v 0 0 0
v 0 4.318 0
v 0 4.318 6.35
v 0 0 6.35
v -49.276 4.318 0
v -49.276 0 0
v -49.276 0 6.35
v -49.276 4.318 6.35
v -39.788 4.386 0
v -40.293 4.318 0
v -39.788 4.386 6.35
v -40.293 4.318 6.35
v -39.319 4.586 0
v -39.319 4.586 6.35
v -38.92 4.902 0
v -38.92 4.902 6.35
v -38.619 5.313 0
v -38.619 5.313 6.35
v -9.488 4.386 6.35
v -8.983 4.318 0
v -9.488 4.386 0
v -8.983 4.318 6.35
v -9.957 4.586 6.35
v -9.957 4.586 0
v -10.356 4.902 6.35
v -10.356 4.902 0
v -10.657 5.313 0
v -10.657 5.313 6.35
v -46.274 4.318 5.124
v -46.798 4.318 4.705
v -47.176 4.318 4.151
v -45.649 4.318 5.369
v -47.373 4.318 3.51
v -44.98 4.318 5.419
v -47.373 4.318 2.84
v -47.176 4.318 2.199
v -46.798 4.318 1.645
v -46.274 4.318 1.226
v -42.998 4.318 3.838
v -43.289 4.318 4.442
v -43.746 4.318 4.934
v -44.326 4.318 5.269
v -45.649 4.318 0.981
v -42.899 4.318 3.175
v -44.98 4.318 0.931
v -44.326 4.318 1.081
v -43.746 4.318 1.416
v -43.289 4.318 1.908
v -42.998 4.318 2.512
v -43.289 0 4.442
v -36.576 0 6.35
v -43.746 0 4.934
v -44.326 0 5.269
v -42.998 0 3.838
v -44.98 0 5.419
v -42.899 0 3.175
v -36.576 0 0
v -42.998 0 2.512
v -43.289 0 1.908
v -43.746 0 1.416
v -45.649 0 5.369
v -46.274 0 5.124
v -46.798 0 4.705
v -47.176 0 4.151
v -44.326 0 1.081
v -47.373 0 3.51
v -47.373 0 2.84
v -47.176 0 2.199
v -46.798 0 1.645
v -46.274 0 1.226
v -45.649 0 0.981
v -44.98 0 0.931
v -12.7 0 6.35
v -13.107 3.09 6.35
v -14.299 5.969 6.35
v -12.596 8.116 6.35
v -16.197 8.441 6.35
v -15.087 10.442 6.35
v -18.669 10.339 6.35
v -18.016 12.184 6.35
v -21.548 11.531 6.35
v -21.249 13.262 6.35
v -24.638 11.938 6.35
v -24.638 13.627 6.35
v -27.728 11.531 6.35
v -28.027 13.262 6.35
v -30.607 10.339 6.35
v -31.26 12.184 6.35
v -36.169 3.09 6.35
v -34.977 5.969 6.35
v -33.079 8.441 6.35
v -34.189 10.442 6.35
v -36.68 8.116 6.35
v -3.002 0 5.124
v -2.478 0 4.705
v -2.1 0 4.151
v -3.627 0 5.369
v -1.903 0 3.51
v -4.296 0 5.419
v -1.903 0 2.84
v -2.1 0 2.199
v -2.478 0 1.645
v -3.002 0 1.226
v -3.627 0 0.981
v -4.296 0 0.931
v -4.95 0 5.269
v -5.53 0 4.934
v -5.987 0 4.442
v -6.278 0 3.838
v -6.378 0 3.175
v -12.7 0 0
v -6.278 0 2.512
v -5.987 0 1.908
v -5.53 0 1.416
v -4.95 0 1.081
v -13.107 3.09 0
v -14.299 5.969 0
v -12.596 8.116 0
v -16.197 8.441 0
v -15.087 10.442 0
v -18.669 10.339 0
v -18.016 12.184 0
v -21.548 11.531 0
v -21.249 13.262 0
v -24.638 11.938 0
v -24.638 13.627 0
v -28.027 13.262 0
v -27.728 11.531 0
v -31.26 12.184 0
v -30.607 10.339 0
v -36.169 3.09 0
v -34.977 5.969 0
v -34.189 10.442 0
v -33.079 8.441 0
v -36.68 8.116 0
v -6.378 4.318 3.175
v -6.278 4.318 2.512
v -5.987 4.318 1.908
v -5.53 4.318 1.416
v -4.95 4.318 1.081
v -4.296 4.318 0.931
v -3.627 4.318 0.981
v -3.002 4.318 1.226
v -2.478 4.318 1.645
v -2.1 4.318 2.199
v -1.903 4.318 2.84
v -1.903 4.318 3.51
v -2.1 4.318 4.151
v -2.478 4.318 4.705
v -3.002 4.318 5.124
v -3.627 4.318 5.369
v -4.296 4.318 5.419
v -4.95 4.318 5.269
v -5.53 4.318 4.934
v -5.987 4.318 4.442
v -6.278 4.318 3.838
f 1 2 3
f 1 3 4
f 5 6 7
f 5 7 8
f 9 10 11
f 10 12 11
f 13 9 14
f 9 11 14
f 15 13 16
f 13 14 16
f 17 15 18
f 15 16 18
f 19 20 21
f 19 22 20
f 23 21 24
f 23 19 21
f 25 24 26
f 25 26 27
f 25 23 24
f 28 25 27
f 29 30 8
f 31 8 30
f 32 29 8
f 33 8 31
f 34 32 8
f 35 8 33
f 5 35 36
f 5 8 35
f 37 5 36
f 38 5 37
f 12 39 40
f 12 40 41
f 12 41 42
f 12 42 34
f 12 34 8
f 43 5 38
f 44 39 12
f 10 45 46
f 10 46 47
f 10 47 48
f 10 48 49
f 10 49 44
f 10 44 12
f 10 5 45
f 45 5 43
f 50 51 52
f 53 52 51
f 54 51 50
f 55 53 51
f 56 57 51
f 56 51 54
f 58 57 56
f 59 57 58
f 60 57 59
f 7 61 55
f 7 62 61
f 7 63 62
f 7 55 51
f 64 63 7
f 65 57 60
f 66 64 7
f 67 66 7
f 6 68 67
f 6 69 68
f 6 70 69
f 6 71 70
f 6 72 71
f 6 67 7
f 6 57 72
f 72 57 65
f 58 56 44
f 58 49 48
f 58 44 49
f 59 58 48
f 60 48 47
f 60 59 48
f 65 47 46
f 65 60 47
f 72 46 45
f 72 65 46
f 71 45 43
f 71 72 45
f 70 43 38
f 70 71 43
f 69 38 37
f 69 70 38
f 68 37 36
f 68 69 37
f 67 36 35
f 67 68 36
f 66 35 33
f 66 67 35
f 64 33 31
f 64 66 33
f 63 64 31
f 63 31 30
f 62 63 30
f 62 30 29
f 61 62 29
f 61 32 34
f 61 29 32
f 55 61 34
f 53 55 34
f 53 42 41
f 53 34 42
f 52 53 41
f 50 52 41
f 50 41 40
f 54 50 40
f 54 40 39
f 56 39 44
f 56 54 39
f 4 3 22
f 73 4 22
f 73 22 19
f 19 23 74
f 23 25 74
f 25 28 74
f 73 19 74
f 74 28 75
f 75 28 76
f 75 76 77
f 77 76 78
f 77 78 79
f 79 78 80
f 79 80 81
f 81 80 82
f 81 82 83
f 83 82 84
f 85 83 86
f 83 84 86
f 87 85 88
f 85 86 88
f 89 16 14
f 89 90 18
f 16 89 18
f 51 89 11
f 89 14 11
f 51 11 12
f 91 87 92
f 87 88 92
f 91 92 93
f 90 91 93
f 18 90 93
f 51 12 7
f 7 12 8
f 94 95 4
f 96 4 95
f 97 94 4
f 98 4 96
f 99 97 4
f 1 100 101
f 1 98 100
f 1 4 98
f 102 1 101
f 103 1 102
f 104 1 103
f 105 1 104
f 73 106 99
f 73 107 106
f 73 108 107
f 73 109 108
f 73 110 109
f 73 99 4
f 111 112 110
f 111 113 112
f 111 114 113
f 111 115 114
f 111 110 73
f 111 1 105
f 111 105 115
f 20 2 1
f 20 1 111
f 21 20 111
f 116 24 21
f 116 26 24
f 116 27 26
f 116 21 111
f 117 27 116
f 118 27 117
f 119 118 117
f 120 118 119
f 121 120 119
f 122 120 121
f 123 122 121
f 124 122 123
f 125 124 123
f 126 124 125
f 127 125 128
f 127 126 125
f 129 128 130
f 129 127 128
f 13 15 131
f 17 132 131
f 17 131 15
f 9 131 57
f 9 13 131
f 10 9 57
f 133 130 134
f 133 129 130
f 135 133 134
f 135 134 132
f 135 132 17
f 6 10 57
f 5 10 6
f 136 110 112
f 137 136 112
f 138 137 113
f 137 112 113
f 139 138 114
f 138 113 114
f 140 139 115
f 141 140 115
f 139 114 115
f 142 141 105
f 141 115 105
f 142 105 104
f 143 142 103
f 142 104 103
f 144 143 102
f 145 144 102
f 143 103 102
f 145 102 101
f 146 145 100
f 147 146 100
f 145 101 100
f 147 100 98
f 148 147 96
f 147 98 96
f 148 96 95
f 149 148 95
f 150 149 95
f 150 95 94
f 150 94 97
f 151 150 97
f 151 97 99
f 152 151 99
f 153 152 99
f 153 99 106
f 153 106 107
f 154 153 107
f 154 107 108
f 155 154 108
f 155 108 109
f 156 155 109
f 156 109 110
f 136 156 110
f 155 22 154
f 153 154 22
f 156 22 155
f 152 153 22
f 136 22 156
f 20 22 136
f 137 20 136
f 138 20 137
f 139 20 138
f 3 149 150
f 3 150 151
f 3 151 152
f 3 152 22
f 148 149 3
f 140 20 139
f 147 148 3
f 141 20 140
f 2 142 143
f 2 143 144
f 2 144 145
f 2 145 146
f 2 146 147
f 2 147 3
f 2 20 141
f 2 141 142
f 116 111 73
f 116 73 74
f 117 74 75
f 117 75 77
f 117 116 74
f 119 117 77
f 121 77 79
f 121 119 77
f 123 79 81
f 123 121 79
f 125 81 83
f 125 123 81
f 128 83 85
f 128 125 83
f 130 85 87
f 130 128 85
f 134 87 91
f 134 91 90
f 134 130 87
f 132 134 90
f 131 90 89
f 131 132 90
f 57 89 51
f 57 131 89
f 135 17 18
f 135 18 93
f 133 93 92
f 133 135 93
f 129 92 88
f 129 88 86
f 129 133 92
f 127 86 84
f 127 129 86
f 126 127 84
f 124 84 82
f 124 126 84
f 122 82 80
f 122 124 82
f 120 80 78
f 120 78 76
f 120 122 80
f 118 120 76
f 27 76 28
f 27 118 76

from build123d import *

# Parameters (mm, degrees)
BOSS_EXTRUDE1_DEPTH  = 6.35
M4_CLEARANCE_HOLE1_D = 4.5
FILLET1_R            = 1.905


with BuildPart() as part:
    # Sketch1 → Boss-Extrude1 (new body)
    with BuildSketch(Plane.XY):
        with BuildLine():
            Line((0, 0), (-12.7, 0))
            ThreePointArc((-12.7, 0), (-24.638, 11.938), (-36.576, 0))
            Line((-36.576, 0), (-49.276, 0))
            Line((-49.276, 0), (-49.276, 4.318))
            Line((-49.276, 4.318), (-39.116, 4.318))
            ThreePointArc((-39.116, 4.318), (-24.638, 13.627054389), (-10.16, 4.318))
            Line((-10.16, 4.318), (0, 4.318))
            Line((0, 4.318), (0, 0))
        make_face()
    extrude(amount=BOSS_EXTRUDE1_DEPTH)

    # M4 Clearance Hole1 (through all)
    with Locations(Plane(origin=(0, 4.318, 0), x_dir=(1, 0, 0), z_dir=(0, 1, 0))):
        with Locations((-4.1275, -3.175)):
            m4_clearance_hole1 = Hole(M4_CLEARANCE_HOLE1_D / 2)

    # Fillet1
    fillet1_edges = [part.edges().sort_by_distance(p)[0] for p in [
        (-39.116, 4.318, 3.175),
        (-10.16, 4.318, 3.175),
    ]]
    fillet(fillet1_edges, radius=FILLET1_R)

    # Mirror1: M4 Clearance Hole1 across plane
    add(m4_clearance_hole1.mirror(Plane(origin=(-24.638, 0, 0), x_dir=(0, 0, 1), z_dir=(1, 0, 0))), mode=Mode.SUBTRACT)


solid = part.part
